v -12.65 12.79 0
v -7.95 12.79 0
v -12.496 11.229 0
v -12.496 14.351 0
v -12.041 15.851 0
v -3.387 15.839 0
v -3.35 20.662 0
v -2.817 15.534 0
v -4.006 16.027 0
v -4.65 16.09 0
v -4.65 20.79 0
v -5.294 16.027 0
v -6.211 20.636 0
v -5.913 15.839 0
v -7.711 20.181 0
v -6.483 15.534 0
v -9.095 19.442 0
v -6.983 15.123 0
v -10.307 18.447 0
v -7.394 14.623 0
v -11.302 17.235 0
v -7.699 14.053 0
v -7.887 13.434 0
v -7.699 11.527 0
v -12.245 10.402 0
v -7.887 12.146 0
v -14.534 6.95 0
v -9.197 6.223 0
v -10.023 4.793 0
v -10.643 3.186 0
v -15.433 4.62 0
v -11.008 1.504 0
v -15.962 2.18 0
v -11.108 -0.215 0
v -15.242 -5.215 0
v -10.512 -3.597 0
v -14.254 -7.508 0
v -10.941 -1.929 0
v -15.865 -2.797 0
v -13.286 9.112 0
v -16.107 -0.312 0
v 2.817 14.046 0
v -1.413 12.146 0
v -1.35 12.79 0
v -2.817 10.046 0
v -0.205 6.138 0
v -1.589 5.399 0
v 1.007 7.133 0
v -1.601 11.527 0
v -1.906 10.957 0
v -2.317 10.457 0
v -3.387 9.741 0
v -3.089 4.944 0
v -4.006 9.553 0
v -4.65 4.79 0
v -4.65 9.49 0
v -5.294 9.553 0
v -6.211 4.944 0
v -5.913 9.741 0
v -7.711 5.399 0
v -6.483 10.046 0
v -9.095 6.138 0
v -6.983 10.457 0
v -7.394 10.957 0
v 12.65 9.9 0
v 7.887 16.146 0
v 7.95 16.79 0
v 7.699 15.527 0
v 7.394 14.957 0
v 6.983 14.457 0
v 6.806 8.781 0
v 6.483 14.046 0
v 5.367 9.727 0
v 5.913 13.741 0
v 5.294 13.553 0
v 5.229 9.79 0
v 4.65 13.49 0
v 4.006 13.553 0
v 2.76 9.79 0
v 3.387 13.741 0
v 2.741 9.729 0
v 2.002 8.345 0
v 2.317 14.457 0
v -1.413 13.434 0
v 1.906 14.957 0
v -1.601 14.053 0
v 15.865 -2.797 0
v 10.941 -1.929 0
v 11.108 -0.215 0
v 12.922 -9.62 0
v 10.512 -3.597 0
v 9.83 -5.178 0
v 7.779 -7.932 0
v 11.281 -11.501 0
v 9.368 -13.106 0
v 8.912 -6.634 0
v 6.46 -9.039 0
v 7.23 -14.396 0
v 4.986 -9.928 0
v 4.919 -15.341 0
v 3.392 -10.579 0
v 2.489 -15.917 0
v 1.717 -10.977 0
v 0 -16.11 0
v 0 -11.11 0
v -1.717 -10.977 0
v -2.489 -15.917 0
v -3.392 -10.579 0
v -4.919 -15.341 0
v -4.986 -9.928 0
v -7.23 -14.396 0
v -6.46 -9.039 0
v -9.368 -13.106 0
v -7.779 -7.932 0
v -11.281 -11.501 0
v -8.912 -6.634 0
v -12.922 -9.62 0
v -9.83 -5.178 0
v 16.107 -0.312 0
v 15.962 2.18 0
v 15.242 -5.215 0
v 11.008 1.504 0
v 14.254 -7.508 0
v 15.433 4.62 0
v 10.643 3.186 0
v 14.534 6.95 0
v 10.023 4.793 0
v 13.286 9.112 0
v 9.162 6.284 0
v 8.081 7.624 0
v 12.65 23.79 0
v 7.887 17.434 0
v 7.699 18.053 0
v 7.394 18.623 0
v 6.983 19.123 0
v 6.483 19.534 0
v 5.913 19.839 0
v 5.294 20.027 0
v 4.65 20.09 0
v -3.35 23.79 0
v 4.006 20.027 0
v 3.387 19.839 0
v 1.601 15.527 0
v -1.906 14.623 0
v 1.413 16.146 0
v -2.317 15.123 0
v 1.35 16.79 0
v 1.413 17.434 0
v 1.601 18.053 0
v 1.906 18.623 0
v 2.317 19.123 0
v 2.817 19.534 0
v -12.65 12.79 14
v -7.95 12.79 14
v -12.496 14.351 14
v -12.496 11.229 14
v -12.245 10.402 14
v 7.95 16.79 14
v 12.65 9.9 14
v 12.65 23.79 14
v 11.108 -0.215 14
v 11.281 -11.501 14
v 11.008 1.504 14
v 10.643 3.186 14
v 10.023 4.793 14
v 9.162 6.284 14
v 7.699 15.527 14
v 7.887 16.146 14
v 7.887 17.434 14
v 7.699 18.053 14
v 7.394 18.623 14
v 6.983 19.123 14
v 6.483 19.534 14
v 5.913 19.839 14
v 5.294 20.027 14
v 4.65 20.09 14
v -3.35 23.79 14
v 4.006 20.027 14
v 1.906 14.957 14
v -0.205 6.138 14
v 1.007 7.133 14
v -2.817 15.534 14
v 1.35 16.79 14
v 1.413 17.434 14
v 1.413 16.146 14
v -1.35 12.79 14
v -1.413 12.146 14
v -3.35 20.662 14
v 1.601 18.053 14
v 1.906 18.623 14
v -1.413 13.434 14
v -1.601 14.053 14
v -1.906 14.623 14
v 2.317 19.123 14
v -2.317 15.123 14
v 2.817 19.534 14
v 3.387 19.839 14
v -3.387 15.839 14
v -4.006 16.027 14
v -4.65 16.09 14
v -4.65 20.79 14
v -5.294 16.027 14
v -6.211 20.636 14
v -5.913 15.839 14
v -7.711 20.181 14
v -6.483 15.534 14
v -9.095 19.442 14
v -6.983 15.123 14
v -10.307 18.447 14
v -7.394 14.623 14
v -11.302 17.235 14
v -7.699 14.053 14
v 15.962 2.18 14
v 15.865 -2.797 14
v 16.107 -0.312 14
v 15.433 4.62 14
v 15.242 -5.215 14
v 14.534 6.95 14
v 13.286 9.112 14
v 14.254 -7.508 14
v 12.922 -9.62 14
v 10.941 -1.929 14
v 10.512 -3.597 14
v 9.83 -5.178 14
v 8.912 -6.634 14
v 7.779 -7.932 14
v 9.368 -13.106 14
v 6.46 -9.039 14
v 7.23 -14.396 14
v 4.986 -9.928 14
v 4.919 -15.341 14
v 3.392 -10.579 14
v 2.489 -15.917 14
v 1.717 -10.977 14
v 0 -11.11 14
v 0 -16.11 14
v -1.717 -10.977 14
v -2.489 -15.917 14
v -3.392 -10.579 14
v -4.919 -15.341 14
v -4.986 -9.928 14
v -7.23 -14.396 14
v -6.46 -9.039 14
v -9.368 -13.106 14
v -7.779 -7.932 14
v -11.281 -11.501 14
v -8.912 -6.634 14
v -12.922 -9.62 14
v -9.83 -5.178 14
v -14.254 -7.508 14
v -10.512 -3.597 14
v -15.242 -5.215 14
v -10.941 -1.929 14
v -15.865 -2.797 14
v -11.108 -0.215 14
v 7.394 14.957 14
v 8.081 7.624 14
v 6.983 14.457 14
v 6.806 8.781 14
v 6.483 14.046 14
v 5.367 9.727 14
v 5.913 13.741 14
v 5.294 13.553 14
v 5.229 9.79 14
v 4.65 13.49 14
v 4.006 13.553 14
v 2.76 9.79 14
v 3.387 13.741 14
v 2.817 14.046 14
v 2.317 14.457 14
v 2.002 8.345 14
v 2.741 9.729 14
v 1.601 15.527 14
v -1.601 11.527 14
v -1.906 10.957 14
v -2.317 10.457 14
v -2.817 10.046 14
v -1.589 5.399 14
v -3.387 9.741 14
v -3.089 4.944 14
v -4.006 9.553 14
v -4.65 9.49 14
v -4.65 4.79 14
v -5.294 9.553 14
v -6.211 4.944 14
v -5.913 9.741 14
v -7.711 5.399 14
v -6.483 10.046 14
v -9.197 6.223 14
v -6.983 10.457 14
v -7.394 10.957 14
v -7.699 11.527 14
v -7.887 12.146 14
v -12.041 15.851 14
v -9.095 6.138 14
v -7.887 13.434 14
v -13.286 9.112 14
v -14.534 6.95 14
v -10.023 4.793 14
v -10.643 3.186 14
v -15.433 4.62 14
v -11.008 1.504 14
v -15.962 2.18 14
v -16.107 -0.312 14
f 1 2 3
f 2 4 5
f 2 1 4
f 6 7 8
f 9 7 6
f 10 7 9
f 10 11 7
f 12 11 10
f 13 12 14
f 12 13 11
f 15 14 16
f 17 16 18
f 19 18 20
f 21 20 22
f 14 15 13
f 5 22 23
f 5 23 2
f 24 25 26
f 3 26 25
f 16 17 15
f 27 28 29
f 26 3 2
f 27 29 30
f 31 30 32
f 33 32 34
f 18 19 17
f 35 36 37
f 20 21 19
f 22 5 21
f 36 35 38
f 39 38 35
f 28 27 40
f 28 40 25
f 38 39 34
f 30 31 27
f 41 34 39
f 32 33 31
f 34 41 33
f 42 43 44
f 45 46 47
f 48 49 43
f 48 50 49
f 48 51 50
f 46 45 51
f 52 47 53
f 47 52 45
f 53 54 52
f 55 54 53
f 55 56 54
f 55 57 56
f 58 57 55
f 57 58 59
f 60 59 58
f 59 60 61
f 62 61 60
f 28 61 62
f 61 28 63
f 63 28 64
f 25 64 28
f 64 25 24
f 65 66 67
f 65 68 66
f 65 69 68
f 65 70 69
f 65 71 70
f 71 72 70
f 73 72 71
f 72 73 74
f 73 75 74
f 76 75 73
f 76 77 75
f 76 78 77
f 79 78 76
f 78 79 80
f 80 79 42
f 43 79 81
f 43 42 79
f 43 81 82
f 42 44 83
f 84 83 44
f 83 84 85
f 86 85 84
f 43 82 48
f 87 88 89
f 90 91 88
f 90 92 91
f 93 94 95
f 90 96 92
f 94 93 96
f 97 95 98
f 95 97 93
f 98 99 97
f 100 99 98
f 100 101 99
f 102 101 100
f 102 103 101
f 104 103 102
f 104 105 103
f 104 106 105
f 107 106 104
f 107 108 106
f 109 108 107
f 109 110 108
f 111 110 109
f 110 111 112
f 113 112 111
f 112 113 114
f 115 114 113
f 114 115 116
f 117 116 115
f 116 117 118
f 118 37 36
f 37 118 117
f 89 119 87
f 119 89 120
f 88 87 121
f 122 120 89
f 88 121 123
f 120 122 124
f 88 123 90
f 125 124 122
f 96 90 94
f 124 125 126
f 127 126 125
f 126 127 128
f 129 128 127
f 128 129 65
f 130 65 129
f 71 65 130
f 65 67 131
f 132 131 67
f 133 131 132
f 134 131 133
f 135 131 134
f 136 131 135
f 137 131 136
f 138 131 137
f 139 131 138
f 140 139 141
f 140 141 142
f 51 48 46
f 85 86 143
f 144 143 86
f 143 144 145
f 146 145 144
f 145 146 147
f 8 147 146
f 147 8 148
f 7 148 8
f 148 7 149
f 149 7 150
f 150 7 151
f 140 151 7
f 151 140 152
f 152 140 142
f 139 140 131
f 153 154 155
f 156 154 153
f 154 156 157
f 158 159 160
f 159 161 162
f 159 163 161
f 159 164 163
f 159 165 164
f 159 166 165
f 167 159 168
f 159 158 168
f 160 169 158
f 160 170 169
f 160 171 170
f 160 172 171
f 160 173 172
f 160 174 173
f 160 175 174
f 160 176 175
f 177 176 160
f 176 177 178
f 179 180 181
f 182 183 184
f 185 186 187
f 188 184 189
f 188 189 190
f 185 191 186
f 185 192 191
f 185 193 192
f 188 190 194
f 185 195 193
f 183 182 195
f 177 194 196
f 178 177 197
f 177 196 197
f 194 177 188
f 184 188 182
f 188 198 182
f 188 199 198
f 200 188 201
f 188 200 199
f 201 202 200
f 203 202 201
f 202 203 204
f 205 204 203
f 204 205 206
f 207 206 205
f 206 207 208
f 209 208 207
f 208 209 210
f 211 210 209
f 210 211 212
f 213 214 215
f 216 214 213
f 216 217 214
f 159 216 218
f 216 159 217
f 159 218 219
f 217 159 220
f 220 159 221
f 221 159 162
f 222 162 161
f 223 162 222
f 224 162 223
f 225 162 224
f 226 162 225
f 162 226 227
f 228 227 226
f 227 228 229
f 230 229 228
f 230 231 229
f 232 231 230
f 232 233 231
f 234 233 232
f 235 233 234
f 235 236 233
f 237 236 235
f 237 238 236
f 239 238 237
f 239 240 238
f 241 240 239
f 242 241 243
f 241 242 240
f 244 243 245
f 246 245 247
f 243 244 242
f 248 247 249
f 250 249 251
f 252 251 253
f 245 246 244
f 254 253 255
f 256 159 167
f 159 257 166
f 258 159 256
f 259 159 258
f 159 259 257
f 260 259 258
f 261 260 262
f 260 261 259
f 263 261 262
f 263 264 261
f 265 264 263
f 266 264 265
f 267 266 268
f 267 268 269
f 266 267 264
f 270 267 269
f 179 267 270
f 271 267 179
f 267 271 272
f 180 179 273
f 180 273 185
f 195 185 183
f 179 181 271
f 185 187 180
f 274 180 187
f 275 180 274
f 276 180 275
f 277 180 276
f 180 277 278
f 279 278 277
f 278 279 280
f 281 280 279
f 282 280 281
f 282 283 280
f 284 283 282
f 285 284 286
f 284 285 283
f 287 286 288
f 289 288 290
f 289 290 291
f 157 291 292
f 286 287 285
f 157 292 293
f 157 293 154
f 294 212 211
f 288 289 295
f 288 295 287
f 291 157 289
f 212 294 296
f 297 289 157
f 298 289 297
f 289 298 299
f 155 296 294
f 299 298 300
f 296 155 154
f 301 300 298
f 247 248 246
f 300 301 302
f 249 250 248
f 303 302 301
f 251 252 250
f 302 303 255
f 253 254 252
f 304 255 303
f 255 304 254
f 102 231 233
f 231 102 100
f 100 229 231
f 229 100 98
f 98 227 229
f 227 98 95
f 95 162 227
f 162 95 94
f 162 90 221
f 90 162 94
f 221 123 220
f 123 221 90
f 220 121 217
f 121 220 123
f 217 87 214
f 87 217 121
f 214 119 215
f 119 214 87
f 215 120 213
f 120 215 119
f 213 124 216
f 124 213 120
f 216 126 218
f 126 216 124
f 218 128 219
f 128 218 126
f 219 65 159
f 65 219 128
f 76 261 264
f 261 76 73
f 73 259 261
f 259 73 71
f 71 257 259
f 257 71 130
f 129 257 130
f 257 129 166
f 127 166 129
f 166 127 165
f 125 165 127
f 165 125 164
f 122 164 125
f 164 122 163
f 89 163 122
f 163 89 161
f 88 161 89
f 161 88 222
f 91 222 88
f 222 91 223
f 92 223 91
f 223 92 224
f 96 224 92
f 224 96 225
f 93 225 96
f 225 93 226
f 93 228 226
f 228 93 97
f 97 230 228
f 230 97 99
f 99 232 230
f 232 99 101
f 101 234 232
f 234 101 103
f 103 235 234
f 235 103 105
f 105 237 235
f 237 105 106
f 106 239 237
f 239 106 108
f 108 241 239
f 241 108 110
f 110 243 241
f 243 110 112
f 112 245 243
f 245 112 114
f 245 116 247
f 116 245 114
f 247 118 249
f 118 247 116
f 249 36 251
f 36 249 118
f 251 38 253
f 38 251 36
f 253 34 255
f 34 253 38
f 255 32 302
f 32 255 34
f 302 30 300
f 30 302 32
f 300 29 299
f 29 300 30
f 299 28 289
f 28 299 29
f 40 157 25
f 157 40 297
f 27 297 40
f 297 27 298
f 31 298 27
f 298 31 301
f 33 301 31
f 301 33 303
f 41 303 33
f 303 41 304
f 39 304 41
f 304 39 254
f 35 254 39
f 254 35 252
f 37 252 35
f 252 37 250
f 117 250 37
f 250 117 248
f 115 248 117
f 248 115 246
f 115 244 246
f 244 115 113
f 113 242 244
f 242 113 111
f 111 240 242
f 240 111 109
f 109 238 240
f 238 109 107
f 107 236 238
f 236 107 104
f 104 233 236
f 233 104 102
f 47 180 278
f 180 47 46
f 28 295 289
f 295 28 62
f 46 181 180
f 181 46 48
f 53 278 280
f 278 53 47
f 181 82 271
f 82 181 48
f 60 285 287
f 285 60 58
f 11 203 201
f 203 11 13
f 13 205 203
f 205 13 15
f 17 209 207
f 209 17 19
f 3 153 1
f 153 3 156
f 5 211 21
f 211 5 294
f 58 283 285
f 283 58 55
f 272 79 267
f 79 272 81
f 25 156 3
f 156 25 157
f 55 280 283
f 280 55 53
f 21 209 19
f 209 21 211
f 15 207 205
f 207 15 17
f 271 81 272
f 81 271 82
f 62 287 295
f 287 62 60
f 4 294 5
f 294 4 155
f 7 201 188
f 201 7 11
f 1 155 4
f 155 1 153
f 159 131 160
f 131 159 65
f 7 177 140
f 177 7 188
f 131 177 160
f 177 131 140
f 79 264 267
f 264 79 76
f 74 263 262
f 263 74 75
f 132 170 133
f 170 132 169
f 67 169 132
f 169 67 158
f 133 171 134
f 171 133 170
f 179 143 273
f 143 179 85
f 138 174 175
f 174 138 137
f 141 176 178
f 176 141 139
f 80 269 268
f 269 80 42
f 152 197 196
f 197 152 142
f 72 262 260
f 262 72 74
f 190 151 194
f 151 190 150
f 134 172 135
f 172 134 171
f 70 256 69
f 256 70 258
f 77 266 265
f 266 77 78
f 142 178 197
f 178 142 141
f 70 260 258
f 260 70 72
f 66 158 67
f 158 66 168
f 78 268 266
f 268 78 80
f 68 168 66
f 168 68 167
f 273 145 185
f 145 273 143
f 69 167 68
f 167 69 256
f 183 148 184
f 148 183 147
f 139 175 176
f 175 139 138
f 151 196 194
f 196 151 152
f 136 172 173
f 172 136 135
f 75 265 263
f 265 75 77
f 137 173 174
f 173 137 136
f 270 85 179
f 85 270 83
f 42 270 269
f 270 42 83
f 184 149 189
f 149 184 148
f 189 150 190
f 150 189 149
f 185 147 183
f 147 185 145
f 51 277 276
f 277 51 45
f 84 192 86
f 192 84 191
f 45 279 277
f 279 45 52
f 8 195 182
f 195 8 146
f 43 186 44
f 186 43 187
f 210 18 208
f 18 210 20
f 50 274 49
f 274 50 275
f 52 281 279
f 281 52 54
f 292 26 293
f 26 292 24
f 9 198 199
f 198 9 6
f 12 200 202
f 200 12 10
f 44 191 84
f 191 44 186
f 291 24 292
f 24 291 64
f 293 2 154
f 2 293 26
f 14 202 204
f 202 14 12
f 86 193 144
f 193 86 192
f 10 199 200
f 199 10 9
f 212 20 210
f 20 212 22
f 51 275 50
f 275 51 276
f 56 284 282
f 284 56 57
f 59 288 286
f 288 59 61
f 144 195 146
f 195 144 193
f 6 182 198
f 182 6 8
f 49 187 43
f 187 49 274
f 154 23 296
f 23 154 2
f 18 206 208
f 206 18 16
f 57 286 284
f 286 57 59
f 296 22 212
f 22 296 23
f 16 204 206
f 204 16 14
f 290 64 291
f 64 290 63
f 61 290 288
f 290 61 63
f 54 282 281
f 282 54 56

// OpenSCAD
$fn = 32;

// ----------------------------------------------------------------------
// Pipe clamp: 32.22 mm ring, 5 mm wall, 14 mm wide
// ----------------------------------------------------------------------

// --- parameters (mm) ---
outer_r = 16.11;          // clamp outside radius
inner_r = 11.11;          // pipe bore radius
band = 5;                 // band thickness
clamp_w = 14;             // clamp width
opening = 40;             // opening angle between the ends
lug_w = 16;               // lug width
lug_len = 14;             // lug length
bolt_d = 6.6;             // bolt hole
knuckle_d = 16;           // hinge knuckle diameter
pin_d = 6.6;              // hinge pin hole

clamp_profile = [[-5.51, 15.138], [-7.783, 14.105], [-9.869, 12.733], [-11.718, 11.055], [-13.286, 9.112], [-14.534, 6.95], [-15.433, 4.62], [-15.962, 2.18], [-16.107, -0.312], [-15.865, -2.797], [-15.242, -5.215], [-14.254, -7.508], [-12.922, -9.62], [-11.281, -11.501], [-9.368, -13.106], [-7.23, -14.396], [-4.919, -15.341], [-2.489, -15.917], [0, -16.11], [2.489, -15.917], [4.919, -15.341], [7.23, -14.396], [9.368, -13.106], [11.281, -11.501], [12.922, -9.62], [14.254, -7.508], [15.242, -5.215], [15.865, -2.797], [16.107, -0.312], [15.962, 2.18], [15.433, 4.62], [14.534, 6.95], [13.286, 9.112], [11.718, 11.055], [9.869, 12.733], [7.783, 14.105], [5.51, 15.138], [3.8, 10.44], [5.367, 9.727], [6.806, 8.781], [8.081, 7.624], [9.162, 6.284], [10.023, 4.793], [10.643, 3.186], [11.008, 1.504], [11.108, -0.215], [10.941, -1.929], [10.512, -3.597], [9.83, -5.178], [8.912, -6.634], [7.779, -7.932], [6.46, -9.039], [4.986, -9.928], [3.392, -10.579], [1.717, -10.977], [0, -11.11], [-1.717, -10.977], [-3.392, -10.579], [-4.986, -9.928], [-6.46, -9.039], [-7.779, -7.932], [-8.912, -6.634], [-9.83, -5.178], [-10.512, -3.597], [-10.941, -1.929], [-11.108, -0.215], [-11.008, 1.504], [-10.643, 3.186], [-10.023, 4.793], [-9.162, 6.284], [-8.081, 7.624], [-6.806, 8.781], [-5.367, 9.727], [-3.8, 10.44]];

difference() {
  union() {
    linear_extrude(height = clamp_w) polygon(clamp_profile);
    /* hinge knuckle, sunk 2 mm into the band end */
    translate([-4.65, 12.79, 0]) cylinder(h = clamp_w, d = knuckle_d);
    /* bolt lug on the other end */
    translate([-3.35, 9.79, 0]) cube([lug_w, 14, clamp_w]);
  }
  translate([4.65, 16.79, -2.5]) cylinder(h = clamp_w + 5, d = bolt_d);
  translate([-4.65, 12.79, -2.5]) cylinder(h = clamp_w + 5, d = pin_d);
}
